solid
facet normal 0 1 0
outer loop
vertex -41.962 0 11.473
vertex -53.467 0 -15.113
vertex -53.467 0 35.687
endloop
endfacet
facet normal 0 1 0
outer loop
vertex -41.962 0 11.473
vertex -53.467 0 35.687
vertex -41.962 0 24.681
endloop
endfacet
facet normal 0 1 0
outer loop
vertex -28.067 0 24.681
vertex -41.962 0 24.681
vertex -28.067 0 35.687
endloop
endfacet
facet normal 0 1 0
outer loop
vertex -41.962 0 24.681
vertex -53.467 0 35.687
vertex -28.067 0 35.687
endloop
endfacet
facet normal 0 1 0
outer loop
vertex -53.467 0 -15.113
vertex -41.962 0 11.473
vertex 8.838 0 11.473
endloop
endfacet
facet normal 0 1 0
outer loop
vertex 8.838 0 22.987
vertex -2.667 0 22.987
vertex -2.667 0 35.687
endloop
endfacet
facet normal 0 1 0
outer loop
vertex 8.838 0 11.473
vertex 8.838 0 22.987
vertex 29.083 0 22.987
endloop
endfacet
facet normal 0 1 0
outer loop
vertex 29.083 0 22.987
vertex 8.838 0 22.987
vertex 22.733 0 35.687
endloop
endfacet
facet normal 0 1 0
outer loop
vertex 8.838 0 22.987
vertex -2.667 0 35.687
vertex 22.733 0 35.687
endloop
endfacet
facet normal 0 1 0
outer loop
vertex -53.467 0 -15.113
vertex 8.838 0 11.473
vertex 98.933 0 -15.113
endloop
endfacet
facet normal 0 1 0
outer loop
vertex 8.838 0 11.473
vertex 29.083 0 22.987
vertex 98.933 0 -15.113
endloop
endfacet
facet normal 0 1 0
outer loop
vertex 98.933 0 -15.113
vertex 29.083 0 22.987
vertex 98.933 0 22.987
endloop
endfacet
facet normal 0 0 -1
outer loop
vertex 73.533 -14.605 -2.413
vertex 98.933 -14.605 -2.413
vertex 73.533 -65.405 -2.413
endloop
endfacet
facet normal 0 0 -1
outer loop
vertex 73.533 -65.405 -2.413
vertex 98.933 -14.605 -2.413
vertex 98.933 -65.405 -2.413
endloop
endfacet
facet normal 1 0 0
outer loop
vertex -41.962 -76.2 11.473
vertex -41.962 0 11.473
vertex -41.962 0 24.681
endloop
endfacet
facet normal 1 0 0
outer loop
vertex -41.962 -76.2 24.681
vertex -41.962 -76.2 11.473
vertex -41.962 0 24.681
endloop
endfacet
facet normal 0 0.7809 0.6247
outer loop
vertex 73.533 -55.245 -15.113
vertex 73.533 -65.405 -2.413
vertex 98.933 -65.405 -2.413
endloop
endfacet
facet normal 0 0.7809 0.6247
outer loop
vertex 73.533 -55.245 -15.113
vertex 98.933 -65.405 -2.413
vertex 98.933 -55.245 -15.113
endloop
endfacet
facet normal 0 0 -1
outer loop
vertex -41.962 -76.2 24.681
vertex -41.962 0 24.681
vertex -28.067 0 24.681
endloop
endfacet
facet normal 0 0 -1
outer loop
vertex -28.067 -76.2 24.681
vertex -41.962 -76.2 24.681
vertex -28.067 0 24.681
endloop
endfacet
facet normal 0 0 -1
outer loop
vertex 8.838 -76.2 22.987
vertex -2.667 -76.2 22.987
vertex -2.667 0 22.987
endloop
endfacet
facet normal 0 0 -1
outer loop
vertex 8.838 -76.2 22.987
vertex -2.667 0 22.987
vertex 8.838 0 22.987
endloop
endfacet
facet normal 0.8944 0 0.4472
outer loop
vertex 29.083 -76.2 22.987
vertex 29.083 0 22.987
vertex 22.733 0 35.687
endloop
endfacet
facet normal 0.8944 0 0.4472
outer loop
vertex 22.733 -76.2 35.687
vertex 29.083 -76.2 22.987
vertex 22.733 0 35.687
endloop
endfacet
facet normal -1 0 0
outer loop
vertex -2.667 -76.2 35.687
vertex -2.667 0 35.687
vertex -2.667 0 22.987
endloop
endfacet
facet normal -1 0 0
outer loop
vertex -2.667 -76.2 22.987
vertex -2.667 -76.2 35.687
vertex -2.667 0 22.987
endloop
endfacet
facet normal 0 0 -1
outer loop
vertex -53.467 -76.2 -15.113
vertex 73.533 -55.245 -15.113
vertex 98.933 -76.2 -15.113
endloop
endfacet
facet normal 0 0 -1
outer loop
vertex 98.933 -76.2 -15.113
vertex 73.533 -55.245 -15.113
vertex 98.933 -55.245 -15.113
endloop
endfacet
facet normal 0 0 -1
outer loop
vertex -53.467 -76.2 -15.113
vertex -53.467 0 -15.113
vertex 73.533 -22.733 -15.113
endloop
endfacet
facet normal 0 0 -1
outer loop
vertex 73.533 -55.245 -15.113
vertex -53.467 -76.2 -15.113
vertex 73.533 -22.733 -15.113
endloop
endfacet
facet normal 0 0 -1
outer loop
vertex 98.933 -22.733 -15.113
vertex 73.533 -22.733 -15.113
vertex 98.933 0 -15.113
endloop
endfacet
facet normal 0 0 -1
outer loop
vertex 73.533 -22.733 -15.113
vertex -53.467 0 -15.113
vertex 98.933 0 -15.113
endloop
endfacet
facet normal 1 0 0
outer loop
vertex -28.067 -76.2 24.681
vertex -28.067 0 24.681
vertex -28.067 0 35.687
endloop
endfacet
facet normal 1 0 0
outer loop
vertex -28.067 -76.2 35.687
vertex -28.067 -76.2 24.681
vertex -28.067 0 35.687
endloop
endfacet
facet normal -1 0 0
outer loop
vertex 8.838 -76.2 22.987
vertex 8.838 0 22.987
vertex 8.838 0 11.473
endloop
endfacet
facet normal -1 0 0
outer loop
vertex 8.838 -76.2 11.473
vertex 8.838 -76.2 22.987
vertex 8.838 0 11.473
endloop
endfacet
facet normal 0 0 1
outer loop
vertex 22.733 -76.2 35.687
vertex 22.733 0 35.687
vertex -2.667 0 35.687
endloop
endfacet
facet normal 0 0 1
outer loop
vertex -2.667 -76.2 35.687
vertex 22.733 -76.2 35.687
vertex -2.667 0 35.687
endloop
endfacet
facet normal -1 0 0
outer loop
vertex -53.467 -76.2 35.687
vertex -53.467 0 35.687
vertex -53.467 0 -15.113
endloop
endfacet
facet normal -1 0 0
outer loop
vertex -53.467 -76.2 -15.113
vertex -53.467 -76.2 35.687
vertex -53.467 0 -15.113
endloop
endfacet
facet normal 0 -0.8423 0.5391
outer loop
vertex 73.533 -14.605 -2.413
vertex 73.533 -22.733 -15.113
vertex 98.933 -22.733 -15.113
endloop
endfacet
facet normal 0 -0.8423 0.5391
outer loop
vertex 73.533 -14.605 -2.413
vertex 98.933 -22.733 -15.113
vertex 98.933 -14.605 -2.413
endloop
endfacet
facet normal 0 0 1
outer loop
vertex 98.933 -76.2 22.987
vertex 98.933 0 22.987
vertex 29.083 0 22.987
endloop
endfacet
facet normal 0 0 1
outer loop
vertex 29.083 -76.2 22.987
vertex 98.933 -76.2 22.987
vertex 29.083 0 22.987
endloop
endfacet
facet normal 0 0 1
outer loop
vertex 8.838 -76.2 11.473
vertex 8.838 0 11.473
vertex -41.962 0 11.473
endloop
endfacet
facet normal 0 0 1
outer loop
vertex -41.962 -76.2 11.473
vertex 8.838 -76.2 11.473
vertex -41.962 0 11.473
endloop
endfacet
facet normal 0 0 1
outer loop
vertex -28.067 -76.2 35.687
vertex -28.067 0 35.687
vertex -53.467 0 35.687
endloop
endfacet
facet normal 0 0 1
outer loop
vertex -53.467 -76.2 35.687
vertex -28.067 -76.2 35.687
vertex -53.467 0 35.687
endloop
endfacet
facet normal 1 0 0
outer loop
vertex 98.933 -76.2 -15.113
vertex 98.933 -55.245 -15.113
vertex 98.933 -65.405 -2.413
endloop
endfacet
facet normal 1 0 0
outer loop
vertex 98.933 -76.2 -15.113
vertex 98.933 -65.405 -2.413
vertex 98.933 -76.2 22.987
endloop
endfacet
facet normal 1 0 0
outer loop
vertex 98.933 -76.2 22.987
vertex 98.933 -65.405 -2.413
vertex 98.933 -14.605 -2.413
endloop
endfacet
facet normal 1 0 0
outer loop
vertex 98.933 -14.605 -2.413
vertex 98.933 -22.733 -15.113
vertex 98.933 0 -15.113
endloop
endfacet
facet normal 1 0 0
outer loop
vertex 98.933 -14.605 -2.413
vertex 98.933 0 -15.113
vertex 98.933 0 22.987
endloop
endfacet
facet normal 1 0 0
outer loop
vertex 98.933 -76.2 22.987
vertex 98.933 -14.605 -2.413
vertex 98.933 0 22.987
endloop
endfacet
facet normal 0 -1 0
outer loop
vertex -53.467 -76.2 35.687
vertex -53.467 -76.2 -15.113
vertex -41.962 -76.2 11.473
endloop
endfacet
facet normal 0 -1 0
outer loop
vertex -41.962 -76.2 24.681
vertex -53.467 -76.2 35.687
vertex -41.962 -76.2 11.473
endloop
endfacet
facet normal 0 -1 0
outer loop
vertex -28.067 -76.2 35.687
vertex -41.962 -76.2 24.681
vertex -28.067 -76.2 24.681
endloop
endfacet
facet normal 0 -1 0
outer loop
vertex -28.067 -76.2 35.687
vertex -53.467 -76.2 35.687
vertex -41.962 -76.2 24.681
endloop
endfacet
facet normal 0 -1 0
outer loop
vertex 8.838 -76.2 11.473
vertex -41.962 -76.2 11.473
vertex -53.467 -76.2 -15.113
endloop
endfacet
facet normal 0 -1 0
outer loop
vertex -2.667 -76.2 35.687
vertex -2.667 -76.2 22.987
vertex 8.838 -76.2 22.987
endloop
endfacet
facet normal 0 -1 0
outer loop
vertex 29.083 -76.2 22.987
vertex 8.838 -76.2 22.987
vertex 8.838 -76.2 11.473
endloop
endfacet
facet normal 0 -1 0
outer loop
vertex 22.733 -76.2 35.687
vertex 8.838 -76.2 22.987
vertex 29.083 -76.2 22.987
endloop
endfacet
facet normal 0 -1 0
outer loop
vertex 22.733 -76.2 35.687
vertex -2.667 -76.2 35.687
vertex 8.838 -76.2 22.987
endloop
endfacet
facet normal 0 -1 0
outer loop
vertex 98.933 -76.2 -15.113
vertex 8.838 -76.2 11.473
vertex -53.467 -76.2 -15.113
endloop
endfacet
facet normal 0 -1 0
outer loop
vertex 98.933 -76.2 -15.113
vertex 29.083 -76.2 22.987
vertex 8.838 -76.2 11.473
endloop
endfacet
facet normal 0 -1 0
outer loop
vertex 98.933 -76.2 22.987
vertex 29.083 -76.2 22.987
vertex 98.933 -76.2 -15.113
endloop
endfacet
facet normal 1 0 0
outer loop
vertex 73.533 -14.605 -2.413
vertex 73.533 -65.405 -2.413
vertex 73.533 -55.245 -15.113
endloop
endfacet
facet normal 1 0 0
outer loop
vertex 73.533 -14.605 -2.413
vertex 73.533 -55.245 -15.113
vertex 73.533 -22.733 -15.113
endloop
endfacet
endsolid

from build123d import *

# Parameters (mm, degrees)
F1_DEPTH = 76.2
F3_DEPTH = 25.4


with BuildPart() as f1:
    # F0 (on Front) → F1 (new body)
    with BuildSketch(Plane.XZ):
        Polygon((-53.467005, 35.687), (-53.467005, -15.113), (98.932995, -15.113), (98.932995, 22.987), (29.082995, 22.987), (22.732995, 35.687), (-2.667005, 35.687), (-2.667005, 22.987), (8.837793, 22.987), (8.837793, 11.473469), (-41.962207, 11.473469), (-41.962207, 24.681469), (-28.067005, 24.681469), (-28.067005, 35.687), align=None)
    extrude(amount=F1_DEPTH)

    # F2 (on face) → F3 (cut)
    with BuildSketch(Plane.YZ.offset(98.932995)):
        Polygon((-14.604999, -2.413), (-65.404999, -2.413), (-55.245001, -15.113), (-22.732999, -15.113), align=None)
    extrude(amount=-F3_DEPTH, mode=Mode.SUBTRACT)


solid = f1.part
